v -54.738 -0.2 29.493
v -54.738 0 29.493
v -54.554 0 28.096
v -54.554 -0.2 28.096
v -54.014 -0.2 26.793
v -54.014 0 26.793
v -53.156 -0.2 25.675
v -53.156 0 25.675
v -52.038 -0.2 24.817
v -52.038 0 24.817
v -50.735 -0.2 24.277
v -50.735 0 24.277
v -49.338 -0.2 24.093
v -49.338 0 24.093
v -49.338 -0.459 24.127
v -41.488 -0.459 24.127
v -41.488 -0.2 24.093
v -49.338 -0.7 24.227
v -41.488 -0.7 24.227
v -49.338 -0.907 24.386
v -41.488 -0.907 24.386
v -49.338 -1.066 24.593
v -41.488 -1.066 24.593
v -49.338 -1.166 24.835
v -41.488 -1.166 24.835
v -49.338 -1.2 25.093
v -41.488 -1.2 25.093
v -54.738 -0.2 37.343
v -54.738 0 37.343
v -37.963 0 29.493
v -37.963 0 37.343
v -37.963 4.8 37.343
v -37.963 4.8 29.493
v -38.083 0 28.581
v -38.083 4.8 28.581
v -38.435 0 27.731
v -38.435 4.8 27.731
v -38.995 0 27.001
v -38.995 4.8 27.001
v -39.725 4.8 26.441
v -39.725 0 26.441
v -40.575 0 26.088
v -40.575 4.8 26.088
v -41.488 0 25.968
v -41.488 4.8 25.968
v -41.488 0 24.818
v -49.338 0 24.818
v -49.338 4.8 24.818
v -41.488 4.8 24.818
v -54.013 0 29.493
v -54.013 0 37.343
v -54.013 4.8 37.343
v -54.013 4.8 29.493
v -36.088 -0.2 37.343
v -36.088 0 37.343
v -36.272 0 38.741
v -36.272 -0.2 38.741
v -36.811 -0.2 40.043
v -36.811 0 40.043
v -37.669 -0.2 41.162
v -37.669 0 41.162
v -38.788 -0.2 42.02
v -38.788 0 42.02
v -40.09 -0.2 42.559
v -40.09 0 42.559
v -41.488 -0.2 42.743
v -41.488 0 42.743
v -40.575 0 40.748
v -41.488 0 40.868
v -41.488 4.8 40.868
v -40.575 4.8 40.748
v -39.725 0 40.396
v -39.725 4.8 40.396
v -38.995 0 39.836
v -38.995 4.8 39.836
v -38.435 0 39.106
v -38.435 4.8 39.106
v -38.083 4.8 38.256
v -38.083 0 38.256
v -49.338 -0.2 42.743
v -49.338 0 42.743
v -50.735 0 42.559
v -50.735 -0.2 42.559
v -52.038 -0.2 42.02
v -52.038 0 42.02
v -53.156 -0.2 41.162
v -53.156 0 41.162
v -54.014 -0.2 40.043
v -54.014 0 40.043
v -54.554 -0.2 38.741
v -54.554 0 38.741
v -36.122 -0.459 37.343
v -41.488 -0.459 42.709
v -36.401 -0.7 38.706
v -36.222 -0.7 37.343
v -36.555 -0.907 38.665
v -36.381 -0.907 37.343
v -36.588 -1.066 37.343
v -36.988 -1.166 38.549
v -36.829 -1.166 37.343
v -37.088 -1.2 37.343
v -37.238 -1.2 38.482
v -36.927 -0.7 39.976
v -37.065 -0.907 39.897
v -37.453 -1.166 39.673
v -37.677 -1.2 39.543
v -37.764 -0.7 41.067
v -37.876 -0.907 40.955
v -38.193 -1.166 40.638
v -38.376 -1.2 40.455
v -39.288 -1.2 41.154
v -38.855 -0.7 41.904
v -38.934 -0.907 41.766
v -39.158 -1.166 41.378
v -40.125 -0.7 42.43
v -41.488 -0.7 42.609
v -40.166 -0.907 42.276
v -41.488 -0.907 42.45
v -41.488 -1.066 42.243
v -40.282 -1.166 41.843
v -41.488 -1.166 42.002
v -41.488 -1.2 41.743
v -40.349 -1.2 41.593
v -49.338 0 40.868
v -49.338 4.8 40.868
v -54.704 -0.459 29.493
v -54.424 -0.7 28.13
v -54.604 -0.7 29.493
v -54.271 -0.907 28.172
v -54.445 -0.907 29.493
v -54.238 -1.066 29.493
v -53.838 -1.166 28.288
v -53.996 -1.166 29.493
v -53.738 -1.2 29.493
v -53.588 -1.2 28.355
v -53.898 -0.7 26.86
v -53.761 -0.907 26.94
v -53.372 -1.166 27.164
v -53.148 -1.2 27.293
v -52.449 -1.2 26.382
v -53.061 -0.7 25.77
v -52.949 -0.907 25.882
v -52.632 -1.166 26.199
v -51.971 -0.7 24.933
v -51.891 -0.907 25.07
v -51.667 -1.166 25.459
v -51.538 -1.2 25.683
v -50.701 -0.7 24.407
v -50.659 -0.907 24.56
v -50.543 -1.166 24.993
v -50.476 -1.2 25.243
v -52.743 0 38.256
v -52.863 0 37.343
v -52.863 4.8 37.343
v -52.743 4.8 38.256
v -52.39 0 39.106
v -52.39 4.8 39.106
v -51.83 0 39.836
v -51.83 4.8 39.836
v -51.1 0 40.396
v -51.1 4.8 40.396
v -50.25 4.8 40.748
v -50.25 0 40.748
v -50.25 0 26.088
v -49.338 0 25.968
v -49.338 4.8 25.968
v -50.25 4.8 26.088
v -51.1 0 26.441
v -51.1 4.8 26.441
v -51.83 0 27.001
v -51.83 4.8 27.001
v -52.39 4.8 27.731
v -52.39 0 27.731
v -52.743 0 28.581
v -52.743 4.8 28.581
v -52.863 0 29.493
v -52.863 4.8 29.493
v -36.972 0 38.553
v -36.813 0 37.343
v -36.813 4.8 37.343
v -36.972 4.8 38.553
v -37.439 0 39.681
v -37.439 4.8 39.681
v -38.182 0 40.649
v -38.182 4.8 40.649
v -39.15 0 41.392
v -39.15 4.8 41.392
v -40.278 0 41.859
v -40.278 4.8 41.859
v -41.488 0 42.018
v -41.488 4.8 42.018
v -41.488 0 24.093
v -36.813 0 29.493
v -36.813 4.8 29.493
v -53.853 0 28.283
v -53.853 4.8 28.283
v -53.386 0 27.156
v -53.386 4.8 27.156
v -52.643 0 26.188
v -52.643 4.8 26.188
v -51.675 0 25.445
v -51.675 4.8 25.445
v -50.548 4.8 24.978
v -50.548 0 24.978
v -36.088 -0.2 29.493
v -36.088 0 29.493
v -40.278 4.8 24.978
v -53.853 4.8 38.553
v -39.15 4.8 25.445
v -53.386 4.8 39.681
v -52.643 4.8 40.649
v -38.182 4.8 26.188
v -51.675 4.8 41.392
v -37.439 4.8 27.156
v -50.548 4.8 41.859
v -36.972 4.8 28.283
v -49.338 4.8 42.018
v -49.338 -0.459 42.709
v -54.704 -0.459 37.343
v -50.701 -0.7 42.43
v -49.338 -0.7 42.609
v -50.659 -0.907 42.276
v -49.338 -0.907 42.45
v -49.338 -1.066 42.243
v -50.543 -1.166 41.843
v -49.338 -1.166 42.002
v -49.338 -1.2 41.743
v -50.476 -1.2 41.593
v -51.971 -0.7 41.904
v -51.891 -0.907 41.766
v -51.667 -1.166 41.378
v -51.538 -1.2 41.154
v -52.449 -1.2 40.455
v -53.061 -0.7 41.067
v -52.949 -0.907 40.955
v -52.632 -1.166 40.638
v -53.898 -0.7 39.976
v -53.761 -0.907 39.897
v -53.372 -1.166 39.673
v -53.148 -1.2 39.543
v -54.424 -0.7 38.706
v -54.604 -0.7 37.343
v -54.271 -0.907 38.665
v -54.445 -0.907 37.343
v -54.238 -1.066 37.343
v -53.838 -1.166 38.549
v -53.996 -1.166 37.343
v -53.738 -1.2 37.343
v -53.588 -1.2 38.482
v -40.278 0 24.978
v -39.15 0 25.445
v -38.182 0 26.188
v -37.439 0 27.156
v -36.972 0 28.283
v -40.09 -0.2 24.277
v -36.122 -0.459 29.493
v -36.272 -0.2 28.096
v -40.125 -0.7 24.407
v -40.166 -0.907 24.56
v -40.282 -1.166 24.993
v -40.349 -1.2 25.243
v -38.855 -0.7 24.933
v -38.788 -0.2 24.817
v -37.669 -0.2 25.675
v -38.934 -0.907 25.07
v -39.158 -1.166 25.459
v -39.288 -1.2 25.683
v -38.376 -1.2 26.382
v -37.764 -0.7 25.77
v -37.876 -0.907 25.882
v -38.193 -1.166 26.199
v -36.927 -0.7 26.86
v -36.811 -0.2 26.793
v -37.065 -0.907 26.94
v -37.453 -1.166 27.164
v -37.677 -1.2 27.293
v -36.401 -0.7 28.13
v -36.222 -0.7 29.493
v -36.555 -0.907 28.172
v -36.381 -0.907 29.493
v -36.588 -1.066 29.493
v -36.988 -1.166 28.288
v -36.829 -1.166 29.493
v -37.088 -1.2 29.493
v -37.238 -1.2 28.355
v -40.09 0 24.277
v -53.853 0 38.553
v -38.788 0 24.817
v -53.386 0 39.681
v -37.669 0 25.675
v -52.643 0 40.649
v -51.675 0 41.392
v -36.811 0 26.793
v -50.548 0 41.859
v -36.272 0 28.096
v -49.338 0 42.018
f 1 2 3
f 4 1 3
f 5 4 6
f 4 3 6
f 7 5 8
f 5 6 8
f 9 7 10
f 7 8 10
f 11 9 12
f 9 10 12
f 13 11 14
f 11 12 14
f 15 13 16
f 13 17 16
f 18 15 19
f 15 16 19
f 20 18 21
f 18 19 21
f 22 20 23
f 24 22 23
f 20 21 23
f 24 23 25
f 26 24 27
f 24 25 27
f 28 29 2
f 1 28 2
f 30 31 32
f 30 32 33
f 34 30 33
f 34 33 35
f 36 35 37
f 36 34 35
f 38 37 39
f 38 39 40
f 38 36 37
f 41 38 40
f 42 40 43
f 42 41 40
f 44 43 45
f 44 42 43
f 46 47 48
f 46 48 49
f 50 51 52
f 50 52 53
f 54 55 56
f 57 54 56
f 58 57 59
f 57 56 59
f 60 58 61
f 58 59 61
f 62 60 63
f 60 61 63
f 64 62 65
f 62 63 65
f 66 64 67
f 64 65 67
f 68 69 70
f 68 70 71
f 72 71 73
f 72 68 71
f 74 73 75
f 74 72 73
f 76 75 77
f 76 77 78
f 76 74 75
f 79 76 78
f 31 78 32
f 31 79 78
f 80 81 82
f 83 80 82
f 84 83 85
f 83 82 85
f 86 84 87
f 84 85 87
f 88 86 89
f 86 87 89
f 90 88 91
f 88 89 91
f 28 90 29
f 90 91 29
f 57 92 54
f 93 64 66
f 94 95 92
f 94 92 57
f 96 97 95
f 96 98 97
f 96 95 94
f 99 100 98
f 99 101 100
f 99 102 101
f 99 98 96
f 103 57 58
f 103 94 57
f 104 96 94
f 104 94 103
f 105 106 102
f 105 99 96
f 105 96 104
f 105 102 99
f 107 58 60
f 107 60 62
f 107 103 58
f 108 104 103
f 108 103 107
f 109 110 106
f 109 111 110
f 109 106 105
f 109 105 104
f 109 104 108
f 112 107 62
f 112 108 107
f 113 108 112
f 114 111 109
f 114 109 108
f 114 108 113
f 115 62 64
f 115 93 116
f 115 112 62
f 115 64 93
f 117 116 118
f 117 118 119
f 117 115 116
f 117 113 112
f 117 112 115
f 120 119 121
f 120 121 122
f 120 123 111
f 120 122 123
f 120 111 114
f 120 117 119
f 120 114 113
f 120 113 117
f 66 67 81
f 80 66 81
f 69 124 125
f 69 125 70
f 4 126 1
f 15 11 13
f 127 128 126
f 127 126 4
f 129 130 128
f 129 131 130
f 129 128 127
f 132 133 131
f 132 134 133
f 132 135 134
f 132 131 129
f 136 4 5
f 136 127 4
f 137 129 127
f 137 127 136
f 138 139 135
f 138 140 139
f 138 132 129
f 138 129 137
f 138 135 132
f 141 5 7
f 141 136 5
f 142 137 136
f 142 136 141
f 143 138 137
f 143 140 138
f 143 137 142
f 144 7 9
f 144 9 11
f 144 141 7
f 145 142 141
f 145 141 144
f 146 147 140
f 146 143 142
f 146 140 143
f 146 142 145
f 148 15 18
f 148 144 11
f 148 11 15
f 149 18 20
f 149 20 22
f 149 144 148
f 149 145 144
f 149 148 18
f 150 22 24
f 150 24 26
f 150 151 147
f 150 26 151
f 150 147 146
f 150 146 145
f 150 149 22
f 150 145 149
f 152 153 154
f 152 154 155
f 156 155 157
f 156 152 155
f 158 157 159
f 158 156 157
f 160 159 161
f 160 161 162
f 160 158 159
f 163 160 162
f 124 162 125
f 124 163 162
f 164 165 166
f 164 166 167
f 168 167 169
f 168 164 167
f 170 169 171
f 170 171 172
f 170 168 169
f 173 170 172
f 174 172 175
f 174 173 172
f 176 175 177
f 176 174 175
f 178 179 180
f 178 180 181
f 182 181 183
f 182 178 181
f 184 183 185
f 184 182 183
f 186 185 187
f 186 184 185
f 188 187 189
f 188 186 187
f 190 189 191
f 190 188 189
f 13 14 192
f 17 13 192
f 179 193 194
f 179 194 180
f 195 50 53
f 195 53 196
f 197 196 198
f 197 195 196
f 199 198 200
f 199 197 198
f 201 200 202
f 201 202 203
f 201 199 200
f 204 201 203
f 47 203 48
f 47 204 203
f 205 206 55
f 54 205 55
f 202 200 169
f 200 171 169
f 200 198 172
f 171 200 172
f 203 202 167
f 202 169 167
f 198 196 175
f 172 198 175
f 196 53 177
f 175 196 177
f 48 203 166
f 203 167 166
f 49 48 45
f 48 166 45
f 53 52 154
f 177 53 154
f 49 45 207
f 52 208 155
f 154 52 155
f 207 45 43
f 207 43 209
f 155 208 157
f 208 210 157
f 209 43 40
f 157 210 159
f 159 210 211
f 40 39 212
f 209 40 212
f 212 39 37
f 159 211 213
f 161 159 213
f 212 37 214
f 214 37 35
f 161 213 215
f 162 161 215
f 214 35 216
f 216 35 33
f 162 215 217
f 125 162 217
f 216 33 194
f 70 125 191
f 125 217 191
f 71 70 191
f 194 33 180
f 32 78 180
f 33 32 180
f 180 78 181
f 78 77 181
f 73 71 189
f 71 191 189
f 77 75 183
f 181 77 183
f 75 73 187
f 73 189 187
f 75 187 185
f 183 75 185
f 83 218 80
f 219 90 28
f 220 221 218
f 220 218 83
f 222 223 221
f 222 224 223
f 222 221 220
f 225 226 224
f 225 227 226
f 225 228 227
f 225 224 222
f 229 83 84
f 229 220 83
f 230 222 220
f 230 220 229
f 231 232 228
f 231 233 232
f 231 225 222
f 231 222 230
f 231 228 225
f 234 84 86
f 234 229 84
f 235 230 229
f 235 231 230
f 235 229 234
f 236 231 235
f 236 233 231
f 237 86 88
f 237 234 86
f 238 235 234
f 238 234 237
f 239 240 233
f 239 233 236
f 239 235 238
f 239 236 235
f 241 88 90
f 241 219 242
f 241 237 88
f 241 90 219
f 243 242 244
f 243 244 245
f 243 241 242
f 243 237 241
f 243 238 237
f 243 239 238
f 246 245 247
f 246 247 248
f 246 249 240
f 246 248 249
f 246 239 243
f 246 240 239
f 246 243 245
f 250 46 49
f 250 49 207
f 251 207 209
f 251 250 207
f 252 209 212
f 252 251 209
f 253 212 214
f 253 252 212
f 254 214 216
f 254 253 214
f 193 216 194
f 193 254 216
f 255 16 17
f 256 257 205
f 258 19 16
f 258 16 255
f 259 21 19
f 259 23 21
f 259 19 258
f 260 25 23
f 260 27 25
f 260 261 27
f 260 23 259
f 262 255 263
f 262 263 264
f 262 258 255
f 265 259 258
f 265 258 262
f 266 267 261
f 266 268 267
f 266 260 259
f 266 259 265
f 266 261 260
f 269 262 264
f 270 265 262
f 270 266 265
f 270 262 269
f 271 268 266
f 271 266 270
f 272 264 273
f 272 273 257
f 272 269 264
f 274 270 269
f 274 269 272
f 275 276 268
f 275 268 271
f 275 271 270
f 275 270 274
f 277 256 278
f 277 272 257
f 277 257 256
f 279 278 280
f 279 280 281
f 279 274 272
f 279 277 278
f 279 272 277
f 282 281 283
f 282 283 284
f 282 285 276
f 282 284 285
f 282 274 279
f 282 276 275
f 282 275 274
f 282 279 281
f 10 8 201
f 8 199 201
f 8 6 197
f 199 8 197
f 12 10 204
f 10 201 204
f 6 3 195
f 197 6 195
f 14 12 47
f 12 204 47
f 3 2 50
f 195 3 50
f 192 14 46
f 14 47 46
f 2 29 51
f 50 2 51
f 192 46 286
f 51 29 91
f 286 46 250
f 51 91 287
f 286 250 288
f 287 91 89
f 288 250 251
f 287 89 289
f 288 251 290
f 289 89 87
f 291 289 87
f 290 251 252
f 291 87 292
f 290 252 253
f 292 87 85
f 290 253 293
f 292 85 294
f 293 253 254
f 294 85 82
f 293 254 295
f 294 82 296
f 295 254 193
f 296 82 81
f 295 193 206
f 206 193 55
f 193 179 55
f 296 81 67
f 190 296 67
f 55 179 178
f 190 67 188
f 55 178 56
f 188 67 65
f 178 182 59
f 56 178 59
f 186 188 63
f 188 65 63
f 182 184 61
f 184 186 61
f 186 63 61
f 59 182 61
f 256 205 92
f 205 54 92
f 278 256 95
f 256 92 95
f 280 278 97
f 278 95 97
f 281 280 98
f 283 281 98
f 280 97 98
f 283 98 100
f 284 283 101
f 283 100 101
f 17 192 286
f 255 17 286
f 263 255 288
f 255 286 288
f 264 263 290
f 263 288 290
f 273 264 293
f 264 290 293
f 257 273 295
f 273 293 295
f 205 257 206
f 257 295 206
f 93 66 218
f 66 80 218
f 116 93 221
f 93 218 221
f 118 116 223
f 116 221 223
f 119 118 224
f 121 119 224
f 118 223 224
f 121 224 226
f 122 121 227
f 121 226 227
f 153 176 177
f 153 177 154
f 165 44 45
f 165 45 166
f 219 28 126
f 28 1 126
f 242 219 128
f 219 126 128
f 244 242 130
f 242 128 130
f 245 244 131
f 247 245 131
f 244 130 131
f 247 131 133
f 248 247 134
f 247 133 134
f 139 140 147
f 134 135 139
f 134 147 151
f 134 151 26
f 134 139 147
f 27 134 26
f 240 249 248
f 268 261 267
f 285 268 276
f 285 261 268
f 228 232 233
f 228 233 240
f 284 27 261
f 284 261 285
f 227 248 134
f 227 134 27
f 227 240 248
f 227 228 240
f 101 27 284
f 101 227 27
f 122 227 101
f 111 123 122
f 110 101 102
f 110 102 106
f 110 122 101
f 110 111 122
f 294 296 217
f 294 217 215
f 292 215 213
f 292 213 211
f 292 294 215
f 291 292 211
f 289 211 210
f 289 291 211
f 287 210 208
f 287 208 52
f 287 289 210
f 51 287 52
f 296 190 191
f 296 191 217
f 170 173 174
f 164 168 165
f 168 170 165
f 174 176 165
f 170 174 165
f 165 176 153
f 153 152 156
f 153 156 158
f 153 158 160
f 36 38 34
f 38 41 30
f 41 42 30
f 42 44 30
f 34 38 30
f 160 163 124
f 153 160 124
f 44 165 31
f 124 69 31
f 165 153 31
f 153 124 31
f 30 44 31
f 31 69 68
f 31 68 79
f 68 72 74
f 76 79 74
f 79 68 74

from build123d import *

# Parameters (mm, degrees)
F1_DEPTH = 1.2
F2_DEPTH = 4.8
F3_R     = 1


with BuildPart() as f1:
    # F0 (on Front) → F1 (new body)
    with BuildSketch(Plane.XZ):
        with BuildLine():
            Line((-41.4876210034, 42.7433328658), (-49.3376210034, 42.7433328658))
            ThreePointArc((-49.3376210034, 42.7433328658), (-53.1559976218, 41.1617094842), (-54.7376210034, 37.3433328658))
            Line((-54.7376210034, 37.3433328658), (-54.7376210034, 29.4933328658))
            ThreePointArc((-54.7376210034, 29.4933328658), (-53.1559976218, 25.6749562474), (-49.3376210034, 24.0933328658))
            Line((-49.3376210034, 24.0933328658), (-41.4876210034, 24.0933328658))
            ThreePointArc((-41.4876210034, 24.0933328658), (-37.669244385, 25.6749562474), (-36.0876210034, 29.4933328658))
            Line((-36.0876210034, 29.4933328658), (-36.0876210034, 37.3433328658))
            ThreePointArc((-36.0876210034, 37.3433328658), (-37.669244385, 41.1617094842), (-41.4876210034, 42.7433328658))
        make_face()
        with BuildLine():
            ThreePointArc((-49.3376210034, 24.8183328658), (-52.6433452054, 26.1876086638), (-54.0126210034, 29.4933328658))
            Line((-54.0126210034, 29.4933328658), (-54.0126210034, 37.3433328658))
            ThreePointArc((-54.0126210034, 37.3433328658), (-52.6433452054, 40.6490570679), (-49.3376210034, 42.0183328658))
            Line((-49.3376210034, 42.0183328658), (-41.4876210034, 42.0183328658))
            ThreePointArc((-41.4876210034, 42.0183328658), (-38.1818968013, 40.6490570679), (-36.8126210034, 37.3433328658))
            Line((-36.8126210034, 37.3433328658), (-36.8126210034, 29.4933328658))
            ThreePointArc((-36.8126210034, 29.4933328658), (-38.1818968013, 26.1876086638), (-41.4876210034, 24.8183328658))
            Line((-41.4876210034, 24.8183328658), (-49.3376210034, 24.8183328658))
        make_face(mode=Mode.SUBTRACT)
        with BuildLine():
            Line((-54.0126210034, 37.3433328658), (-54.0126210034, 29.4933328658))
            ThreePointArc((-54.0126210034, 29.4933328658), (-52.6433452054, 26.1876086638), (-49.3376210034, 24.8183328658))
            Line((-49.3376210034, 24.8183328658), (-41.4876210034, 24.8183328658))
            ThreePointArc((-41.4876210034, 24.8183328658), (-38.1818968013, 26.1876086638), (-36.8126210034, 29.4933328658))
            Line((-36.8126210034, 29.4933328658), (-36.8126210034, 37.3433328658))
            ThreePointArc((-36.8126210034, 37.3433328658), (-38.1818968013, 40.6490570679), (-41.4876210034, 42.0183328658))
            Line((-41.4876210034, 42.0183328658), (-49.3376210034, 42.0183328658))
            ThreePointArc((-49.3376210034, 42.0183328658), (-52.6433452054, 40.6490570679), (-54.0126210034, 37.3433328658))
        make_face()
        with BuildLine():
            Line((-52.8626210034, 29.4933328658), (-52.8626210034, 37.3433328658))
            ThreePointArc((-52.8626210034, 37.3433328658), (-51.8301724071, 39.8358842695), (-49.3376210034, 40.8683328658))
            Line((-49.3376210034, 40.8683328658), (-41.4876210034, 40.8683328658))
            ThreePointArc((-41.4876210034, 40.8683328658), (-38.9950695997, 39.8358842695), (-37.9626210034, 37.3433328658))
            Line((-37.9626210034, 37.3433328658), (-37.9626210034, 29.4933328658))
            ThreePointArc((-37.9626210034, 29.4933328658), (-38.9950695997, 27.0007814622), (-41.4876210034, 25.9683328658))
            Line((-41.4876210034, 25.9683328658), (-49.3376210034, 25.9683328658))
            ThreePointArc((-49.3376210034, 25.9683328658), (-51.8301724071, 27.0007814622), (-52.8626210034, 29.4933328658))
        make_face(mode=Mode.SUBTRACT)
        with BuildLine():
            ThreePointArc((-49.3376210034, 40.8683328658), (-51.8301724071, 39.8358842695), (-52.8626210034, 37.3433328658))
            Line((-52.8626210034, 37.3433328658), (-52.8626210034, 29.4933328658))
            ThreePointArc((-52.8626210034, 29.4933328658), (-51.8301724071, 27.0007814622), (-49.3376210034, 25.9683328658))
            Line((-49.3376210034, 25.9683328658), (-41.4876210034, 25.9683328658))
            ThreePointArc((-41.4876210034, 25.9683328658), (-38.9950695997, 27.0007814622), (-37.9626210034, 29.4933328658))
            Line((-37.9626210034, 29.4933328658), (-37.9626210034, 37.3433328658))
            ThreePointArc((-37.9626210034, 37.3433328658), (-38.9950695997, 39.8358842695), (-41.4876210034, 40.8683328658))
            Line((-41.4876210034, 40.8683328658), (-49.3376210034, 40.8683328658))
        make_face()
    extrude(amount=F1_DEPTH)

    # F0 (on Front) → F2 (join)
    with BuildSketch(Plane.XZ):
        with BuildLine():
            Line((-54.0126210034, 37.3433328658), (-54.0126210034, 29.4933328658))
            ThreePointArc((-54.0126210034, 29.4933328658), (-52.6433452054, 26.1876086638), (-49.3376210034, 24.8183328658))
            Line((-49.3376210034, 24.8183328658), (-41.4876210034, 24.8183328658))
            ThreePointArc((-41.4876210034, 24.8183328658), (-38.1818968013, 26.1876086638), (-36.8126210034, 29.4933328658))
            Line((-36.8126210034, 29.4933328658), (-36.8126210034, 37.3433328658))
            ThreePointArc((-36.8126210034, 37.3433328658), (-38.1818968013, 40.6490570679), (-41.4876210034, 42.0183328658))
            Line((-41.4876210034, 42.0183328658), (-49.3376210034, 42.0183328658))
            ThreePointArc((-49.3376210034, 42.0183328658), (-52.6433452054, 40.6490570679), (-54.0126210034, 37.3433328658))
        make_face()
        with BuildLine():
            Line((-52.8626210034, 29.4933328658), (-52.8626210034, 37.3433328658))
            ThreePointArc((-52.8626210034, 37.3433328658), (-51.8301724071, 39.8358842695), (-49.3376210034, 40.8683328658))
            Line((-49.3376210034, 40.8683328658), (-41.4876210034, 40.8683328658))
            ThreePointArc((-41.4876210034, 40.8683328658), (-38.9950695997, 39.8358842695), (-37.9626210034, 37.3433328658))
            Line((-37.9626210034, 37.3433328658), (-37.9626210034, 29.4933328658))
            ThreePointArc((-37.9626210034, 29.4933328658), (-38.9950695997, 27.0007814622), (-41.4876210034, 25.9683328658))
            Line((-41.4876210034, 25.9683328658), (-49.3376210034, 25.9683328658))
            ThreePointArc((-49.3376210034, 25.9683328658), (-51.8301724071, 27.0007814622), (-52.8626210034, 29.4933328658))
        make_face(mode=Mode.SUBTRACT)
    extrude(amount=-F2_DEPTH)

    # F3
    f3_edges = [f1.edges().sort_by_distance(p)[0] for p in [
        (-37.669244, -1.2, 41.161709),
    ]]
    fillet(f3_edges, radius=F3_R)


solid = f1.part
